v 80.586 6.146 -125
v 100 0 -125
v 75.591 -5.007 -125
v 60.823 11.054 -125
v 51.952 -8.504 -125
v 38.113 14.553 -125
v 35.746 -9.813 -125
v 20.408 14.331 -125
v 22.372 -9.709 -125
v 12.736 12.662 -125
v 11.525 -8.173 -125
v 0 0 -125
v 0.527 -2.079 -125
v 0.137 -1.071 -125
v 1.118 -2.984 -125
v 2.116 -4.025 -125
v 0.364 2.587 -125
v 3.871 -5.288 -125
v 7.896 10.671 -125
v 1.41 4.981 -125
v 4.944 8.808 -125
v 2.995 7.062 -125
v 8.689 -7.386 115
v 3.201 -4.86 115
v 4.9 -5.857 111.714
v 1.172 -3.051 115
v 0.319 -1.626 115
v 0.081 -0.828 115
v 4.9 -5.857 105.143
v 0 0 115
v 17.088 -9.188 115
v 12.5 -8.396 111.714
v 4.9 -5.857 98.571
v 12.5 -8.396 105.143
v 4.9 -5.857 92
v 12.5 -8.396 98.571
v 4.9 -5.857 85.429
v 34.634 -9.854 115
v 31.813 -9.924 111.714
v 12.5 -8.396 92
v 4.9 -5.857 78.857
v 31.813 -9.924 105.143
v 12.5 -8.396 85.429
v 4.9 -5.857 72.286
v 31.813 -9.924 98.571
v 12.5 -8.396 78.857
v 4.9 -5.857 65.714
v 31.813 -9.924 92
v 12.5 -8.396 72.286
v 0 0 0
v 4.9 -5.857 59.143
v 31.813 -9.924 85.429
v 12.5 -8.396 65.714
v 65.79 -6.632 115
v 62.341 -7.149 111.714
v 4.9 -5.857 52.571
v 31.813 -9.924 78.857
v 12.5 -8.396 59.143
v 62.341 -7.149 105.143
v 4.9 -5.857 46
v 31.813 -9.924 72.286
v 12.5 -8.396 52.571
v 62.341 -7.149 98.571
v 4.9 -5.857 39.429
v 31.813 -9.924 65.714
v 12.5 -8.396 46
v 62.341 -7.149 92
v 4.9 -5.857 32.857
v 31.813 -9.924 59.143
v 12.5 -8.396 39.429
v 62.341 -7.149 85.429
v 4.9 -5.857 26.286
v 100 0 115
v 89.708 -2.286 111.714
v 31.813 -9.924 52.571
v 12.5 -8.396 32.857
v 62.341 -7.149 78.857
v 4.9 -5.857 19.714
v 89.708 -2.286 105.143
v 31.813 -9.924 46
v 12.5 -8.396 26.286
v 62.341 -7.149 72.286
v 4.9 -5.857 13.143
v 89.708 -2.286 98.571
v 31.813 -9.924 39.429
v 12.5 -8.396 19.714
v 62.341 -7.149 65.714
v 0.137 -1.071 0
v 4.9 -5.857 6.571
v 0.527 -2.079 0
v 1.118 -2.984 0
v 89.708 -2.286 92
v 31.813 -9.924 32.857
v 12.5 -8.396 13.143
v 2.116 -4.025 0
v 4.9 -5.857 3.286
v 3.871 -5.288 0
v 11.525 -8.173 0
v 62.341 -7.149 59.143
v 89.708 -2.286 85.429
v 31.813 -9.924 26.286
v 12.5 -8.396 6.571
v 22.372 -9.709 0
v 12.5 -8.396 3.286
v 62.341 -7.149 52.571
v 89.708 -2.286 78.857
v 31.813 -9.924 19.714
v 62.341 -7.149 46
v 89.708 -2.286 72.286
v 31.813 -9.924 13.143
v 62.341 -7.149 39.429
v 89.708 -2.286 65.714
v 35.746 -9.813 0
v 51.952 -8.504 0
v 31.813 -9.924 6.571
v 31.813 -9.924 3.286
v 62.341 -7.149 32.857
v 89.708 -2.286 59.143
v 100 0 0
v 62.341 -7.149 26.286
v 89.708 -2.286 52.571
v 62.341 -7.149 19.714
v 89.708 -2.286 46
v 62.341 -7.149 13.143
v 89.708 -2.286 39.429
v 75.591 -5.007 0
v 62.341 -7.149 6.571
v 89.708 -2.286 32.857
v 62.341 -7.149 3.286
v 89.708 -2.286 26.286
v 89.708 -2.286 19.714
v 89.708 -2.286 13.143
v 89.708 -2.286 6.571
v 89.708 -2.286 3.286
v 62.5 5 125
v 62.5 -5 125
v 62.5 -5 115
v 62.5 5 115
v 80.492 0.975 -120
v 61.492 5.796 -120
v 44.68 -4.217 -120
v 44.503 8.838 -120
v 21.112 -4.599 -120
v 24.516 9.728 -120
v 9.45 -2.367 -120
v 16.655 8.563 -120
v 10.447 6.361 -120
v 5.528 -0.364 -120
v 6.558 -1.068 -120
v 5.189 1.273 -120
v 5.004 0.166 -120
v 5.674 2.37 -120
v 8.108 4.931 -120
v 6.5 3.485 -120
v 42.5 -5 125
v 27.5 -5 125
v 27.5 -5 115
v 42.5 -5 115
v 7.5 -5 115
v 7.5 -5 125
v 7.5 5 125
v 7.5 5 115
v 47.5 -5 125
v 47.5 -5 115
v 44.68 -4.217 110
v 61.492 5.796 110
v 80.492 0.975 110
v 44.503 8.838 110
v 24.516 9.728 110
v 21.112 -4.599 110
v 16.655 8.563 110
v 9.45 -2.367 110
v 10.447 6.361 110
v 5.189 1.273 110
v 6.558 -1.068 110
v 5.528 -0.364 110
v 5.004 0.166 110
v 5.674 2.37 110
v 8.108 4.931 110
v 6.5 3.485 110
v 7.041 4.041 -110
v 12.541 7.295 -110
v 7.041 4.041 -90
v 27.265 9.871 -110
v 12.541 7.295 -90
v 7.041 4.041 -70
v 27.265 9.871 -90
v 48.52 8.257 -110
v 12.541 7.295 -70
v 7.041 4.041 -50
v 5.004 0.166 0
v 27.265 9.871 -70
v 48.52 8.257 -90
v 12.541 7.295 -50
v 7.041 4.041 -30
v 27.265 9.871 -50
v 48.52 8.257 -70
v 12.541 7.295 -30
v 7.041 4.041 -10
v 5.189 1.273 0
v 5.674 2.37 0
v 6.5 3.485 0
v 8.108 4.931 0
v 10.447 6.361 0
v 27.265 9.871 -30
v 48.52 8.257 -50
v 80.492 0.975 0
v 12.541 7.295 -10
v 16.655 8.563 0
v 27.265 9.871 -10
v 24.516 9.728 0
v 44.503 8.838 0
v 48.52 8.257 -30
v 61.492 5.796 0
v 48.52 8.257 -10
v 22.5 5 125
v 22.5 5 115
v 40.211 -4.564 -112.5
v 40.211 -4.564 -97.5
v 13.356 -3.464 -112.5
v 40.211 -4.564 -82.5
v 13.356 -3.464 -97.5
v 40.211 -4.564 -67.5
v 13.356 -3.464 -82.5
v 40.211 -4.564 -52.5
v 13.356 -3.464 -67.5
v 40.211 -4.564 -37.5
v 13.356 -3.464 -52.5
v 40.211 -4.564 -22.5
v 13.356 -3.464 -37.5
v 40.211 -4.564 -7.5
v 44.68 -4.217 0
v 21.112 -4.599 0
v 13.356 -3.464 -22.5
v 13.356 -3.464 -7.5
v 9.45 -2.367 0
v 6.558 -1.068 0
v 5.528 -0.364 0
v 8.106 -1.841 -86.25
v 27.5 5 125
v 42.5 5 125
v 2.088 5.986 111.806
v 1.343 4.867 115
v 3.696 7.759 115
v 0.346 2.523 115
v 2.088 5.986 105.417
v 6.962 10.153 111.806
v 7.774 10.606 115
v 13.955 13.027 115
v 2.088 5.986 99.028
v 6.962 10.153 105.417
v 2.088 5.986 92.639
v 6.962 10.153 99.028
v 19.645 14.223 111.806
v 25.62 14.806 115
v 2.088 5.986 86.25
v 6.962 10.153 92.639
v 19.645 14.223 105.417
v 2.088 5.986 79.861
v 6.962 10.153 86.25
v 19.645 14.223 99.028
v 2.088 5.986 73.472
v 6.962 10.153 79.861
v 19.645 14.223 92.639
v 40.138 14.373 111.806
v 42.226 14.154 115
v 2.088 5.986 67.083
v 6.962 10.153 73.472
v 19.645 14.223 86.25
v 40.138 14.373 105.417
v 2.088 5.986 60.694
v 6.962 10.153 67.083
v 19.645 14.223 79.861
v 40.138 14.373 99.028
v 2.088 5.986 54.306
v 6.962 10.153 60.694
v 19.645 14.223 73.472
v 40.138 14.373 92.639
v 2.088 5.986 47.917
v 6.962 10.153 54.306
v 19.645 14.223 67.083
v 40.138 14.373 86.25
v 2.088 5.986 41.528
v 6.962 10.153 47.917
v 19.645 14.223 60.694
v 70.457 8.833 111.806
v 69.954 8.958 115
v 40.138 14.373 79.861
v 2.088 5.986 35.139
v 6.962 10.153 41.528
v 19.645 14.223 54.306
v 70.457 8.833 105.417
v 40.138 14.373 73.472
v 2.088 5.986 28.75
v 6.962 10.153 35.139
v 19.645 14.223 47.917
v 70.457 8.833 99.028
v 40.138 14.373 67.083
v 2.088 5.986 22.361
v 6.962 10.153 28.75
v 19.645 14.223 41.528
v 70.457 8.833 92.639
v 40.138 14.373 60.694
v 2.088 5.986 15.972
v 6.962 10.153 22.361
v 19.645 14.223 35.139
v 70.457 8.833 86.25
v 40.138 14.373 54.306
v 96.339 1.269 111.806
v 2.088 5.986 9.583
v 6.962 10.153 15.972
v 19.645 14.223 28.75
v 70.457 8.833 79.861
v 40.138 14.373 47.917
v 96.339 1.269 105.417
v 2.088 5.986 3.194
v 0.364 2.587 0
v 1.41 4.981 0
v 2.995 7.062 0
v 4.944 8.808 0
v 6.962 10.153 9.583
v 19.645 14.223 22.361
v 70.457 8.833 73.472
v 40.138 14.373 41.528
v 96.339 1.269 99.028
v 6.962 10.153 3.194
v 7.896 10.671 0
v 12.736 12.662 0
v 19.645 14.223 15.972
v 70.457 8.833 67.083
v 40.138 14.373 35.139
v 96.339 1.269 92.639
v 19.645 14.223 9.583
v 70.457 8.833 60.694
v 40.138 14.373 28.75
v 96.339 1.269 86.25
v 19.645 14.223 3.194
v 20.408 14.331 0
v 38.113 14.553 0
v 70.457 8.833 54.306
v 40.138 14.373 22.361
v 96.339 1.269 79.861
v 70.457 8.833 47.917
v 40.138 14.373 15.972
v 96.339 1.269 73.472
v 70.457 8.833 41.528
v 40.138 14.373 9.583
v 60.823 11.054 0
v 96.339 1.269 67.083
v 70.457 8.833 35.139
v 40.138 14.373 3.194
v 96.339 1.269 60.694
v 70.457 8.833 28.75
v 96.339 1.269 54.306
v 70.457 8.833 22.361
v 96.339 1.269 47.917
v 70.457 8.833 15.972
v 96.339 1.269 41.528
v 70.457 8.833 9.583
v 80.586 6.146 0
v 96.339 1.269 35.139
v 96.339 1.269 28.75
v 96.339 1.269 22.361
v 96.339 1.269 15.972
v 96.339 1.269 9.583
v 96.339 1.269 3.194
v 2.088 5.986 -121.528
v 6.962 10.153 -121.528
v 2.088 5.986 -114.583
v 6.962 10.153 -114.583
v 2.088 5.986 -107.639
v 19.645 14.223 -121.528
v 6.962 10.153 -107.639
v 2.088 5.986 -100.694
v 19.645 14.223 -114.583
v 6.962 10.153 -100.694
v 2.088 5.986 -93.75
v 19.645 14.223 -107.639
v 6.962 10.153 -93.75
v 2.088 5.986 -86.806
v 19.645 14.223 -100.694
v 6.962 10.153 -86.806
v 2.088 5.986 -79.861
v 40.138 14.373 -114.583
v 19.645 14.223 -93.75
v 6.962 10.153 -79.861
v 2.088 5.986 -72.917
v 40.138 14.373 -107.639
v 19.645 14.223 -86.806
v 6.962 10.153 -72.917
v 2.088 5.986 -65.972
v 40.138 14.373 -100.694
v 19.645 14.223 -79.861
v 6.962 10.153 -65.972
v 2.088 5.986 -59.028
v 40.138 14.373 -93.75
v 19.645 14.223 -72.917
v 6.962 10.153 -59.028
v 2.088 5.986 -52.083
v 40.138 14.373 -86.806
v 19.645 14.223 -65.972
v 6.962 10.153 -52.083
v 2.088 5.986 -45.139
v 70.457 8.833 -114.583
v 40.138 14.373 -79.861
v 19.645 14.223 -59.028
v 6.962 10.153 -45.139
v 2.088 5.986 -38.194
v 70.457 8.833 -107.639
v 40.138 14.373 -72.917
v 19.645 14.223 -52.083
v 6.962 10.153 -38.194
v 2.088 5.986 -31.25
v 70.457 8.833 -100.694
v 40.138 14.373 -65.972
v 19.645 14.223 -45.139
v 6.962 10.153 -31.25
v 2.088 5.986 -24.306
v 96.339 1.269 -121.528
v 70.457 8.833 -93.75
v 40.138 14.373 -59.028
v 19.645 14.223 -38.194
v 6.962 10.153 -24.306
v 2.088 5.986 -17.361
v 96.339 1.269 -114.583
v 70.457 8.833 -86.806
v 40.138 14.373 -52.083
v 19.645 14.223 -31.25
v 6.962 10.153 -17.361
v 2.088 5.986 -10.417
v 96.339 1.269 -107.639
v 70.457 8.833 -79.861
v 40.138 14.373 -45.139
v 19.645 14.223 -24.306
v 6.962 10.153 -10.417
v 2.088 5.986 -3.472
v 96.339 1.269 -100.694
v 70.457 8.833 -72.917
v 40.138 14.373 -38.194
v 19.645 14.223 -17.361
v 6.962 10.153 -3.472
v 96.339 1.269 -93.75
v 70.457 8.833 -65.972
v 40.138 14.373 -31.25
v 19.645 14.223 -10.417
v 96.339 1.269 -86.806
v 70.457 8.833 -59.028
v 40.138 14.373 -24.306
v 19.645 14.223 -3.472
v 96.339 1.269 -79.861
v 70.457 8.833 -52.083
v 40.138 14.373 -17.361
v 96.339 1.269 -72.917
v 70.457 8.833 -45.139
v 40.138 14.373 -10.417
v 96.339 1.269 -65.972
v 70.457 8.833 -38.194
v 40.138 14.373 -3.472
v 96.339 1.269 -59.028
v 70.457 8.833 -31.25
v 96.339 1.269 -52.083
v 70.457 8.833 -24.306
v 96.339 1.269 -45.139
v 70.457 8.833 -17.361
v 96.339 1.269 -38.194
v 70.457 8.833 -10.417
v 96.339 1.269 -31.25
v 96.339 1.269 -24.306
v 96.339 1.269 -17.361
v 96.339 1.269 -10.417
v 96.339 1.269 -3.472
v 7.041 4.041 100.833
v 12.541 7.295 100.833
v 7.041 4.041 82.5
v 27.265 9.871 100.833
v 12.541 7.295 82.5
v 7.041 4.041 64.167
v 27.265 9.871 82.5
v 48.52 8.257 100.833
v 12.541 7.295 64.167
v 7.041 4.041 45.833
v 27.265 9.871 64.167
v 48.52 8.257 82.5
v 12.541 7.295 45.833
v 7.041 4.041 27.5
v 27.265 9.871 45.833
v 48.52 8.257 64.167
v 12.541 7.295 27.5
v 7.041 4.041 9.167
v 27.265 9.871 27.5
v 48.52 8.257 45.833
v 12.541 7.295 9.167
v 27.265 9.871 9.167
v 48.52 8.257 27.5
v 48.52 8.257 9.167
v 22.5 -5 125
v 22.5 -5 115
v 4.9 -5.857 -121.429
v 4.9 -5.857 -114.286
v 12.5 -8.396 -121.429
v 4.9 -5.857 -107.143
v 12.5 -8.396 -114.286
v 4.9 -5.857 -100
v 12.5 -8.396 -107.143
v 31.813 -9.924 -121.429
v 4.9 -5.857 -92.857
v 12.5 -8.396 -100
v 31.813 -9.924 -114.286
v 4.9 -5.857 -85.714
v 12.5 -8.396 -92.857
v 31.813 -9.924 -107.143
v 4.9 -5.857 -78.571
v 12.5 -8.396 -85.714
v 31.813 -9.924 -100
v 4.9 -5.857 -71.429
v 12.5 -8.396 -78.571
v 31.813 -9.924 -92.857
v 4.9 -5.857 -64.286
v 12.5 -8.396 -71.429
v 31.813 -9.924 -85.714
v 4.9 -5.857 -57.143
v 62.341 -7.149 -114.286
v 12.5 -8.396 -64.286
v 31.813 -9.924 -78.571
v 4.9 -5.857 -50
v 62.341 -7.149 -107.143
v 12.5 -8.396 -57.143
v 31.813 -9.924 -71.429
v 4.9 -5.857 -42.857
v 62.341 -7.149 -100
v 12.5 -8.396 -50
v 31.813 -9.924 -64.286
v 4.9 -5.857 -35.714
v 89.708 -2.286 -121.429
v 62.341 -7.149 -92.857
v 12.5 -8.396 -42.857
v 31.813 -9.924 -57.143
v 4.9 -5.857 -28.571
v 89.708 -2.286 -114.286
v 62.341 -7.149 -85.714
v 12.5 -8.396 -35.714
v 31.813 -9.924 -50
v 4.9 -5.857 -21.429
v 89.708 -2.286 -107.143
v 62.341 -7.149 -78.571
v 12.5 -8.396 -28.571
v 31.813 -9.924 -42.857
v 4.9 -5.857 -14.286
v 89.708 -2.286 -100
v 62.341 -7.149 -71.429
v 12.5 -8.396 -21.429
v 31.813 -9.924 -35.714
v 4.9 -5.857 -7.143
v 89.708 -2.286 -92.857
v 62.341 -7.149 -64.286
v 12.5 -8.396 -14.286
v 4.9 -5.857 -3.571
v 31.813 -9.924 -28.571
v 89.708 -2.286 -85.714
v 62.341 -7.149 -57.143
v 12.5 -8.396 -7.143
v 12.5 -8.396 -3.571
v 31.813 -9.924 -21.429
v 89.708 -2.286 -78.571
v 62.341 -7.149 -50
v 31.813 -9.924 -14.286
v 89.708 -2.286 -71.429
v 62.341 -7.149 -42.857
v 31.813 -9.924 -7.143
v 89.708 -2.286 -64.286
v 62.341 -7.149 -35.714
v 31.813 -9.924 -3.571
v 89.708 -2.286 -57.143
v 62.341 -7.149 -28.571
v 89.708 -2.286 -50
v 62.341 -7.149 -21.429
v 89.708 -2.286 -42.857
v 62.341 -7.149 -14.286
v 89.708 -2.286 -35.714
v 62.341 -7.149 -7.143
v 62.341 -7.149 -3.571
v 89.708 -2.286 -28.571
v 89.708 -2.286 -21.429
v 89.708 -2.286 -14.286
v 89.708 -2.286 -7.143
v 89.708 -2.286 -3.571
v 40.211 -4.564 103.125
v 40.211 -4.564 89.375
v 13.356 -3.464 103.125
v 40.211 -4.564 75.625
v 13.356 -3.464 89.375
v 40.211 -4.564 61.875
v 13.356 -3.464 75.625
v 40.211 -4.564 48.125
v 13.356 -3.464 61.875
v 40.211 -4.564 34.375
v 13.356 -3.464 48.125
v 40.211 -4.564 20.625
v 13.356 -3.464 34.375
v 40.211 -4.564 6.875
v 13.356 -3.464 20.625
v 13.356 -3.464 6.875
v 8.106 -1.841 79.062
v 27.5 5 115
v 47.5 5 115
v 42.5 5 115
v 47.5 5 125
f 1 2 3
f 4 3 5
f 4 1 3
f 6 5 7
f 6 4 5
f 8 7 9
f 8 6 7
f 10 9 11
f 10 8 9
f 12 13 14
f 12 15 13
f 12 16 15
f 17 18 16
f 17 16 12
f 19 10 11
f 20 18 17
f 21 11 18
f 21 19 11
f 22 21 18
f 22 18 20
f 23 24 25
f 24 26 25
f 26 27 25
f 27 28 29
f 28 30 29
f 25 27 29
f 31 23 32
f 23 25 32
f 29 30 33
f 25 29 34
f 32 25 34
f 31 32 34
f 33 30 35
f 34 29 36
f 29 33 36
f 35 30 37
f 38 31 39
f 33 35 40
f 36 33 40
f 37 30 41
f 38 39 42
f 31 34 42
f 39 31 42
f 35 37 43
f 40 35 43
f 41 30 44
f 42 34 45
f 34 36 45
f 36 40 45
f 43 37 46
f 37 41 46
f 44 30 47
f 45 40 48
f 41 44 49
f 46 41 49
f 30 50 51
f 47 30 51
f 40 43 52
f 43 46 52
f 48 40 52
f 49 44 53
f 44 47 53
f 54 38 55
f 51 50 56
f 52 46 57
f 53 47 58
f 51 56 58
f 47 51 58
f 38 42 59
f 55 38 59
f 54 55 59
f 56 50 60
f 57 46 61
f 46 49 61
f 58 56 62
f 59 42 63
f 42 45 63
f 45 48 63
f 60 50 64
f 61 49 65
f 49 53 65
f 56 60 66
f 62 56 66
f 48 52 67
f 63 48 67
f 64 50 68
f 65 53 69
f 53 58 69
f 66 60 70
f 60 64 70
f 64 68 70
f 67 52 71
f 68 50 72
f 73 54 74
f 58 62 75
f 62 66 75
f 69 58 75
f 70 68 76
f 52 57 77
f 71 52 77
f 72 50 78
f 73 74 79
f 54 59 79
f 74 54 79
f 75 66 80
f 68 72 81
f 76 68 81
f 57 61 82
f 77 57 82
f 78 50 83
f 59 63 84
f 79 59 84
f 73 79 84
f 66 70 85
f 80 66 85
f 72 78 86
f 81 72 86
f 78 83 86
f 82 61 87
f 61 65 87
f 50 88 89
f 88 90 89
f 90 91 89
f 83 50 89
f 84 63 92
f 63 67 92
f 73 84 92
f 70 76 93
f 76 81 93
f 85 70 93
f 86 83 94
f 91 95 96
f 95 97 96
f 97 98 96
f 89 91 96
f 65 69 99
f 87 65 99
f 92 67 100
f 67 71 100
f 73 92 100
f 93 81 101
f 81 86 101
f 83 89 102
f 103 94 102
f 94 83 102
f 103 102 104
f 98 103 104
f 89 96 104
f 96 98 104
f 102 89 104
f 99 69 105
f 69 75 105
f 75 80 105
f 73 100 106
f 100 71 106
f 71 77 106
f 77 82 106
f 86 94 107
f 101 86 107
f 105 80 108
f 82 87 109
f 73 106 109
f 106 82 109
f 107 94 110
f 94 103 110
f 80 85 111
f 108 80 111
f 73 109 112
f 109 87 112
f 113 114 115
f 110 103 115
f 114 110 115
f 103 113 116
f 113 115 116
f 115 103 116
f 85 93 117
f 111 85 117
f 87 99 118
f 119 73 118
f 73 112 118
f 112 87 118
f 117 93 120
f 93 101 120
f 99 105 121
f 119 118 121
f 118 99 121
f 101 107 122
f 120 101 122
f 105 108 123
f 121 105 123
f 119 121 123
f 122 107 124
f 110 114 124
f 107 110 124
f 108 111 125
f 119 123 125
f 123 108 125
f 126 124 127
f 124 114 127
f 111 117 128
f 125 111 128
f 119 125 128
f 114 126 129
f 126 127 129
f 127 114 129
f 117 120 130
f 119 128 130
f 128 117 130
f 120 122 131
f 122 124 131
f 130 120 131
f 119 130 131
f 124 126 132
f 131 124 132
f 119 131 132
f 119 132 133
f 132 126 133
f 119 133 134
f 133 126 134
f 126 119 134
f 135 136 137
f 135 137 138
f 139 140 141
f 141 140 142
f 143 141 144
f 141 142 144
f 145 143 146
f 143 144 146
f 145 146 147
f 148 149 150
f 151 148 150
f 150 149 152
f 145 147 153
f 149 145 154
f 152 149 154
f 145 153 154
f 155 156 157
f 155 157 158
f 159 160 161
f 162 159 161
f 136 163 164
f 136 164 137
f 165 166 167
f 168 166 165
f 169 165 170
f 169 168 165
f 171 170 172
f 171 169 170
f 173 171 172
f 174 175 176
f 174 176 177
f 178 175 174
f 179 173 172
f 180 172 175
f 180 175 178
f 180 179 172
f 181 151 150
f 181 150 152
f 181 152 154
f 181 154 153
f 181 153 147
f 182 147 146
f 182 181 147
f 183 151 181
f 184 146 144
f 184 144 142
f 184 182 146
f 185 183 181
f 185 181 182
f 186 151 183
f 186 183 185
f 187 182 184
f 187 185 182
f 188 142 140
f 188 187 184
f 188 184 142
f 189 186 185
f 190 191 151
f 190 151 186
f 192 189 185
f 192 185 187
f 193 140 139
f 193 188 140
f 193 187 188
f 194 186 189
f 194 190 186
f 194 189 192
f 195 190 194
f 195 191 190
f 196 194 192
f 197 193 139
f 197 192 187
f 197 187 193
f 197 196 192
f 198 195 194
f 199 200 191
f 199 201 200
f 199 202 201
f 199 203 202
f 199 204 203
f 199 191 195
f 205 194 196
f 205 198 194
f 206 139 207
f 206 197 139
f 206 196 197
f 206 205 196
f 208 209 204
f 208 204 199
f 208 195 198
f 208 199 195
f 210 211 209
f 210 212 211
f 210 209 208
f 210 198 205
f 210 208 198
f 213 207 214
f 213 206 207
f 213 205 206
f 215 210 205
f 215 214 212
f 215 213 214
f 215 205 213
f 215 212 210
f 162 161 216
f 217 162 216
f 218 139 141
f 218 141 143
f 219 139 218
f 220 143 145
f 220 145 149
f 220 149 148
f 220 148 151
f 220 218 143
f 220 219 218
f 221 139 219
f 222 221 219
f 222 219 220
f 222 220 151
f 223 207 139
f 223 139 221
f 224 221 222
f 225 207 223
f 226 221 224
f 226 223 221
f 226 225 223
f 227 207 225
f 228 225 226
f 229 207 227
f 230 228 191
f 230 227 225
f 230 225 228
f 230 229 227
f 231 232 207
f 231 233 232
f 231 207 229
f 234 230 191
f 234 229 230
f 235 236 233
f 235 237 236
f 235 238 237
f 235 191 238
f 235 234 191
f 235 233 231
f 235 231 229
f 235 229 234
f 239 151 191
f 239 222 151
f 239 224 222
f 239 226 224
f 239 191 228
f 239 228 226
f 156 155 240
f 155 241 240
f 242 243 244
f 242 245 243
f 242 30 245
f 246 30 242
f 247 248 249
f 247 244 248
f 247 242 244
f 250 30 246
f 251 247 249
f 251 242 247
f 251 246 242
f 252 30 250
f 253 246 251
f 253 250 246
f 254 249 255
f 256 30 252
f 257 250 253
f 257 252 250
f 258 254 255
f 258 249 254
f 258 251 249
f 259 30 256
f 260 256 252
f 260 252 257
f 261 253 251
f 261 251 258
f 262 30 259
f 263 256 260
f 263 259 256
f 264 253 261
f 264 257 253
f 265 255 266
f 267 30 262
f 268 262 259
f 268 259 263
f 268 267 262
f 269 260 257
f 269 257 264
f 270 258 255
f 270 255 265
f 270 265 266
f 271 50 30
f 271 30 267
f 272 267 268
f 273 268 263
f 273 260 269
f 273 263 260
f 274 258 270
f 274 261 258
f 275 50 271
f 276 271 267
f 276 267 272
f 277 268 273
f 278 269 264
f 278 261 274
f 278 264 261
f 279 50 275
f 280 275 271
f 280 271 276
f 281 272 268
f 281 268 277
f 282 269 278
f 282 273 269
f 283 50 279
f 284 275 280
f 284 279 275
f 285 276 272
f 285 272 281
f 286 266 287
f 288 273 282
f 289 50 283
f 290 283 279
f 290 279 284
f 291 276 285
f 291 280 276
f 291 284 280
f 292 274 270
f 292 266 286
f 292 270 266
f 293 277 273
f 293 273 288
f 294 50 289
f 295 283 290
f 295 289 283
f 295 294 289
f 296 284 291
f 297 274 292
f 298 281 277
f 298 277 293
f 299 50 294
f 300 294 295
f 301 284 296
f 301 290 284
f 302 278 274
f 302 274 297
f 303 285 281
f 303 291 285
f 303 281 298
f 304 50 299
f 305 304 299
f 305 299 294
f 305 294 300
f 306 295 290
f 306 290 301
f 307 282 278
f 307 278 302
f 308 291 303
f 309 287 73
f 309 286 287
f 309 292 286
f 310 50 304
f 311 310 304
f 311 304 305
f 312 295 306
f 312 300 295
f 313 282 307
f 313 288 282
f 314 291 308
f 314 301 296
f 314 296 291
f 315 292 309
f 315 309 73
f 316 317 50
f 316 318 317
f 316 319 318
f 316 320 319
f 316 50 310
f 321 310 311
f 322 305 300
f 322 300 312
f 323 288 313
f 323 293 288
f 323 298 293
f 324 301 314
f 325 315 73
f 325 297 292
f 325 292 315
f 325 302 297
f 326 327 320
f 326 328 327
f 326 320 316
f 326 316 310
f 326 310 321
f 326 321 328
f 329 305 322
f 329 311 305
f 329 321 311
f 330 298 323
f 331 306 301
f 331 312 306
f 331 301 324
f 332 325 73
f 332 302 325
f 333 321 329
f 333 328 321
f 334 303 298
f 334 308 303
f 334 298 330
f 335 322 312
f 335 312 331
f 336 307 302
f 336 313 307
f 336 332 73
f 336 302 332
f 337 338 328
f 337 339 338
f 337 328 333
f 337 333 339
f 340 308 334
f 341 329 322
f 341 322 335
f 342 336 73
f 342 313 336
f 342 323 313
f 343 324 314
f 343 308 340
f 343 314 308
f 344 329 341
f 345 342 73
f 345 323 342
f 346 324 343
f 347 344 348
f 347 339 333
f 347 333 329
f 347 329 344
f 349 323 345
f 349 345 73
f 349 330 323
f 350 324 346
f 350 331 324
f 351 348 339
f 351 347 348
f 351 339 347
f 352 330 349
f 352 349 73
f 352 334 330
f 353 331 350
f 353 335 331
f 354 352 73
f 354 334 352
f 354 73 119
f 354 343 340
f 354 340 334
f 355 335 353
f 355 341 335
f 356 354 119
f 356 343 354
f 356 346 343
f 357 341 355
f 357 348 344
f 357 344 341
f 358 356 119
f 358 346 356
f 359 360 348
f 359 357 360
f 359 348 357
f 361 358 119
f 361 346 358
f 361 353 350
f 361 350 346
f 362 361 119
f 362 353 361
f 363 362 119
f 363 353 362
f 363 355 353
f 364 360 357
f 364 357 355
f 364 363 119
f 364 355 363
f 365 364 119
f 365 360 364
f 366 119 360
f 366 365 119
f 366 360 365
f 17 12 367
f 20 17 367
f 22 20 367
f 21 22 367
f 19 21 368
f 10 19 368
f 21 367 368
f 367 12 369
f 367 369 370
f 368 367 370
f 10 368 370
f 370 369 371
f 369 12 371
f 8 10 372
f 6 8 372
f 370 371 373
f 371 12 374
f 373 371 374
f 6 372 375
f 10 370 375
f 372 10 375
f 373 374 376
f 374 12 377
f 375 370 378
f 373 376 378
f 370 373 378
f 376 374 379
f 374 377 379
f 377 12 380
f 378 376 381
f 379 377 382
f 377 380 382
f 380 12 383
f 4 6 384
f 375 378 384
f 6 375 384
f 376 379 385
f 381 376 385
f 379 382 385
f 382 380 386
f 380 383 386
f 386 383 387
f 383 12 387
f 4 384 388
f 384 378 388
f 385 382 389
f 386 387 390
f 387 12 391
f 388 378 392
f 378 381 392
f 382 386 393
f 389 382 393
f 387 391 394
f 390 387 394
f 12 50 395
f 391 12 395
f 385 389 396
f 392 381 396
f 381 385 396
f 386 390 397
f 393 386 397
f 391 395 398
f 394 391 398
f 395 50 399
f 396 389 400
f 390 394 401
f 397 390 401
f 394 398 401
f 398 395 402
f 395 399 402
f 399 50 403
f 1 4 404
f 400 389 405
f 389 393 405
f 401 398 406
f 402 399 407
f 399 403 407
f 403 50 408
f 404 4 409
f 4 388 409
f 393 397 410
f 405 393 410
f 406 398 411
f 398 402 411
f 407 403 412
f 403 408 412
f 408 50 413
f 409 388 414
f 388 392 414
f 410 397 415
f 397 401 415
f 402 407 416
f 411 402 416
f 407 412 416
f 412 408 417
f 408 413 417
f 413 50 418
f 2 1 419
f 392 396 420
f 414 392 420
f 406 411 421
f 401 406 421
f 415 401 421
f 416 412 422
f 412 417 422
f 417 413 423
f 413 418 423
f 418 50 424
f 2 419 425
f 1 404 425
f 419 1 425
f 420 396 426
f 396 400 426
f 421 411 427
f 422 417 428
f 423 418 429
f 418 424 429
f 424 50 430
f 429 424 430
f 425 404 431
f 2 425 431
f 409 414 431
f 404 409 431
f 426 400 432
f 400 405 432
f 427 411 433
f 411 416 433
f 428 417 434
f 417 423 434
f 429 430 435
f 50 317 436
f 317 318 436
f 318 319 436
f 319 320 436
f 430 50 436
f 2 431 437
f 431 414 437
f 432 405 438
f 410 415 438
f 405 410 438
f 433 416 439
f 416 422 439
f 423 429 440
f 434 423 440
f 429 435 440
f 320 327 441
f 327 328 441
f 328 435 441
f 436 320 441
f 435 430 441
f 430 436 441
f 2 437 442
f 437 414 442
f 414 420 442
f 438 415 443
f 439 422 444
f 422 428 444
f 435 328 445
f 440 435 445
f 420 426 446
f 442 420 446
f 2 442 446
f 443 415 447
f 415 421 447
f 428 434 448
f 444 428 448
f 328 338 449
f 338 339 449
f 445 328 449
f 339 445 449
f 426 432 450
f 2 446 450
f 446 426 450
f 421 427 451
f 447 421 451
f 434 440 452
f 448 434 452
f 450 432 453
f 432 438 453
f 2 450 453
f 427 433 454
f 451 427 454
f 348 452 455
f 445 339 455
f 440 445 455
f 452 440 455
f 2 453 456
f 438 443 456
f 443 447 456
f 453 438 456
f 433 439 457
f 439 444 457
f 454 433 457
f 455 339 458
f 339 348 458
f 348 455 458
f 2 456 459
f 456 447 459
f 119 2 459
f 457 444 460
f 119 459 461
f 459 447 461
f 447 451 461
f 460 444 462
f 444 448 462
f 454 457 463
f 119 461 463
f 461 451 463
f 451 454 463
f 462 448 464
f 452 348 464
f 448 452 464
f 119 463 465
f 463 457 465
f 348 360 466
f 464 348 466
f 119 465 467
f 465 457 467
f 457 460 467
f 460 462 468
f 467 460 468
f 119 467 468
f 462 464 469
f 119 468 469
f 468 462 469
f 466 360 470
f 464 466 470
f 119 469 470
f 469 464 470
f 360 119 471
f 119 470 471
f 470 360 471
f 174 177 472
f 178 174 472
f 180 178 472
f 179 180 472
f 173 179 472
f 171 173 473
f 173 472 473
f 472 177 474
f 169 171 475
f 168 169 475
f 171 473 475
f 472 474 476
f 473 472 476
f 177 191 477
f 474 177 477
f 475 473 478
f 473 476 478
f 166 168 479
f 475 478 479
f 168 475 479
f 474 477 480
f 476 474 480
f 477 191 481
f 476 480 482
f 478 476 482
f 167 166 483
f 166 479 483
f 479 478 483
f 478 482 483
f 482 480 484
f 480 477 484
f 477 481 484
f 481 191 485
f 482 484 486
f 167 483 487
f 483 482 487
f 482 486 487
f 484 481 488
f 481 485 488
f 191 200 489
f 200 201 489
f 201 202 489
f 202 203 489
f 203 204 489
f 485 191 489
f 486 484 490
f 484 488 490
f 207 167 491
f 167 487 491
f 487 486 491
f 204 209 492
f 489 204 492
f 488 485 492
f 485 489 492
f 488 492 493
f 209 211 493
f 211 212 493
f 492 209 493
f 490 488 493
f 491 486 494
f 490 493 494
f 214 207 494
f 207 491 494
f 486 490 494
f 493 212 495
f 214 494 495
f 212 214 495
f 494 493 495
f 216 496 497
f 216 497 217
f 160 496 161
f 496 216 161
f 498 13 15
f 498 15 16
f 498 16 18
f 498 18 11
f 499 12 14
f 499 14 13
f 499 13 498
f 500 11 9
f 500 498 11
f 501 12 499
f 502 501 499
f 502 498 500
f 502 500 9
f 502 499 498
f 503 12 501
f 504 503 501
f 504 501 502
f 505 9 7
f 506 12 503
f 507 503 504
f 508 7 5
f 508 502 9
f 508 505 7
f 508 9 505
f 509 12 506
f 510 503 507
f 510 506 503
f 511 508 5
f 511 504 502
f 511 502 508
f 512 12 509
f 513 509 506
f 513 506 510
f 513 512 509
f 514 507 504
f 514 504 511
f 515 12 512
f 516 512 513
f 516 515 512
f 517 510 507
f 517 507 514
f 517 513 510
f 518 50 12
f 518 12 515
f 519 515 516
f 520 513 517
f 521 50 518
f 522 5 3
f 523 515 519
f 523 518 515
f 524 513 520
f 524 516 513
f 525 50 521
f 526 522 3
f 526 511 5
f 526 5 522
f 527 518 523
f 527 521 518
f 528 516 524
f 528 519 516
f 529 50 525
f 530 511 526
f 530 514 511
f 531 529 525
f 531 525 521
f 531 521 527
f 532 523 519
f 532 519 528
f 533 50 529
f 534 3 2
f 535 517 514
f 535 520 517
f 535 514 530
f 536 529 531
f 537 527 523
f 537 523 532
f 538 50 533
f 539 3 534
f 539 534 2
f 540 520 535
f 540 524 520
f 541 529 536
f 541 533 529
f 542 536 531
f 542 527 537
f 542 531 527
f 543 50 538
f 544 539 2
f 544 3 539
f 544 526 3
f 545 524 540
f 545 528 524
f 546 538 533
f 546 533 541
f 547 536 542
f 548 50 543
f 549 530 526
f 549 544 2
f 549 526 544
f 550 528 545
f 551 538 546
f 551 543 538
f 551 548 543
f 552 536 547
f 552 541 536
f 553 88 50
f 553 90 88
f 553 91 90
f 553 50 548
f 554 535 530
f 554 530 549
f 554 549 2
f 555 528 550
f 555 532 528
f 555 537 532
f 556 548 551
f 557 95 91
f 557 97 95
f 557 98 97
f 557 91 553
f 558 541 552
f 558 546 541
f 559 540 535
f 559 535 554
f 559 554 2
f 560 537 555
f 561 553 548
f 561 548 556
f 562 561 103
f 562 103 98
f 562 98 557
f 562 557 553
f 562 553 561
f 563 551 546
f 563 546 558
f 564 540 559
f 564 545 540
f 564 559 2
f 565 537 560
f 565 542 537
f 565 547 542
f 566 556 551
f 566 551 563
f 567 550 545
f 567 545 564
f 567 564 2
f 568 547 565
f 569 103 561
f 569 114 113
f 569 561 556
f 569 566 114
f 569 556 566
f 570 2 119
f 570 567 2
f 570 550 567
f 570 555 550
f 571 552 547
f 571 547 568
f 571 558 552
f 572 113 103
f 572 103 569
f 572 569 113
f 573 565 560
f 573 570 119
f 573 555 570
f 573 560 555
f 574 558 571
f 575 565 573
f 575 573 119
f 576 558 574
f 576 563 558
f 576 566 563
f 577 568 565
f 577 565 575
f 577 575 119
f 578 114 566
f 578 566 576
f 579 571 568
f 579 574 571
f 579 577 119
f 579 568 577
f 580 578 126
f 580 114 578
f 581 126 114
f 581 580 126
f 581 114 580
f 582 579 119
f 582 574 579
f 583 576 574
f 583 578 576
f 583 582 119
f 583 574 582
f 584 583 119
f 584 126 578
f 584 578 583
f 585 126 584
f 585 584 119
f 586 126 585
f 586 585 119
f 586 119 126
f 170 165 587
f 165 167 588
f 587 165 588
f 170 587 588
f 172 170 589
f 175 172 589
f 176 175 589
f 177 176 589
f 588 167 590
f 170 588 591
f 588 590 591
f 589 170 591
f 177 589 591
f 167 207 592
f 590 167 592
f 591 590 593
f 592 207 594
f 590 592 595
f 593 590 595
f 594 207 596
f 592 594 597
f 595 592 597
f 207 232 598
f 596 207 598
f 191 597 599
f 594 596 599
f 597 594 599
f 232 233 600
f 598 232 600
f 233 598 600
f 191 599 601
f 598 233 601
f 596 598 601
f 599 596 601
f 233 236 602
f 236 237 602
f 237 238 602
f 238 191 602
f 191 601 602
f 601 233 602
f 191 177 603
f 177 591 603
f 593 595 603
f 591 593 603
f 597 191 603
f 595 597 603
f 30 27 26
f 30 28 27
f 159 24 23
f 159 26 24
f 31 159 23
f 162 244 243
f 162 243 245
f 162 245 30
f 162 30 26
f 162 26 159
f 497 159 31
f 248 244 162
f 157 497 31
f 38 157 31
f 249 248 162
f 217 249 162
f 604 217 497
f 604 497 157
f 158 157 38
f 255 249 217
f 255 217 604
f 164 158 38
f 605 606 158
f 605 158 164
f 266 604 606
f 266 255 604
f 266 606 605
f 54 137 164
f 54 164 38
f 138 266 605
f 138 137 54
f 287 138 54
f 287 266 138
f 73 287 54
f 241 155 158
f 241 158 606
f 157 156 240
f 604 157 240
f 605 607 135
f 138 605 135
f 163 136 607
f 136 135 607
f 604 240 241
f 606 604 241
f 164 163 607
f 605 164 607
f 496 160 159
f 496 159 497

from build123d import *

# Parameters (mm, degrees)
BOSS_EXTRUDE1_DEPTH     = 125
CUT_EXTRUDE1_DEPTH      = 110
CUT_EXTRUDE1_DEPTH_BACK = 120
SKETCH8_OUTSIDE_W       = 156.08
SKETCH8_OUTSIDE_H       = 80.93
SKETCH8_OUTSIDE_W_2     = 15
SKETCH8_OUTSIDE_H_2     = 10
CUT_EXTRUDE2_DEPTH      = 10


with BuildPart() as part:
    # Sketch1 → Boss-Extrude1 (new body, symmetric)
    with BuildSketch(Plane.XY):
        with BuildLine():
            add(Edge.make_bspline(
                [(0, 0), (0.000850995, 0.329659199), (0.029549865, 0.927472015), (0.14385133, 1.796745902), (0.437026819, 2.918116545), (0.854897816, 3.99067399), (1.431457873, 5.075606208), (2.192315162, 6.177305776), (3.200330795, 7.329994922), (4.495933807, 8.510625759), (6.154032841, 9.714948919), (8.274086435, 10.929186229), (10.956963281, 12.114631433), (14.147653492, 13.152534318), (18.040460609, 14.036328853), (23.13432232, 14.736569605), (29.235682959, 15.027445823), (35.337980191, 14.824799668), (41.101061226, 14.313753112), (46.84100573, 13.596774566), (51.603718071, 12.850513756), (56.345578755, 11.983351698), (61.067148387, 11.013921336), (64.832774323, 10.182970339), (68.586460194, 9.301464098), (72.329426272, 8.372556112), (76.059801155, 7.399362237), (79.315748534, 6.509324276), (82.095955547, 5.720960272), (84.412746103, 5.044415193), (86.253737616, 4.495737821), (88.110746108, 3.929395104), (89.928948501, 3.364622885), (91.806033909, 2.766575591), (93.571042413, 2.195551738), (95.520153622, 1.546294126), (97.13830136, 1.000944859), (98.775140125, 0.431667147), (99.586664269, 0.14652965), (100.000220498, 0)],
                knots=[0, 0, 0, 0, 0, 0.011046069, 0.020081733, 0.029325805, 0.03880189, 0.049580055, 0.06120956, 0.074146174, 0.090070544, 0.108265326, 0.129826997, 0.155964864, 0.18830697, 0.220649281, 0.263591413, 0.32827592, 0.392960436, 0.425302696, 0.457644956, 0.52232947, 0.55467173, 0.58701399, 0.619356253, 0.651698515, 0.684040775, 0.716383035, 0.748725291, 0.764896419, 0.781067547, 0.797238677, 0.813409806, 0.829580935, 0.845752065, 0.861923198, 0.878094331, 0.894265464, 0.910433902, 0.910433902, 0.910433902, 0.910433902, 0.910433902], degree=4))
            add(Edge.make_bspline(
                [(0, 0), (0.000283694, -0.169267254), (0.015976794, -0.461371136), (0.077487025, -0.88514164), (0.233270026, -1.435649885), (0.451244669, -1.960918505), (0.763020391, -2.515682909), (1.196819683, -3.111846412), (1.800946429, -3.766711239), (2.645862845, -4.495413172), (3.845009807, -5.315163118), (5.520192869, -6.210587445), (7.890487327, -7.180714875), (10.947062049, -8.096276481), (15.429604607, -9.039640979), (21.207967366, -9.730011133), (27.977535992, -10.02746215), (35.648602876, -9.889128299), (42.346864335, -9.465706657), (48.074827103, -8.93985543), (53.791477179, -8.306095929), (59.496830619, -7.576550222), (65.188499989, -6.746051578), (70.86666832, -5.830240622), (75.589869863, -5.014181774), (79.362447213, -4.33071773), (82.659602016, -3.705830248), (85.480106996, -3.151491524), (87.596226543, -2.723280533), (89.000489113, -2.434123885), (90.181059485, -2.187185496), (91.104029231, -1.992562417), (92.305099816, -1.735390328), (93.655404022, -1.443860687), (95.389810689, -1.059643077), (97.102663756, -0.674849293), (98.714450572, -0.301843412), (99.575627153, -0.100232022), (100.000220498, 0)],
                knots=[0, 0, 0, 0, 0, 0.005887152, 0.010193359, 0.014866851, 0.019889426, 0.025655397, 0.032314697, 0.040497527, 0.050864902, 0.064448179, 0.082823086, 0.106555664, 0.139953895, 0.175459216, 0.242255956, 0.309052716, 0.375849477, 0.442646237, 0.47604462, 0.509443003, 0.576239764, 0.643036527, 0.676434909, 0.709833291, 0.743231671, 0.77663005, 0.793329242, 0.810028433, 0.818378029, 0.826727624, 0.83507722, 0.843426816, 0.860126007, 0.876825198, 0.893524389, 0.91022358, 0.91022358, 0.91022358, 0.91022358, 0.91022358], degree=4))
        make_face()
    extrude(amount=BOSS_EXTRUDE1_DEPTH, both=True)

    # Sketch6 → Cut-Extrude1 (cut, two sides)
    with BuildSketch(Plane.XY) as cut_extrude1_sk:
        with BuildLine():
            add(Edge.make_bspline(
                [(5.003866411, 0.16593331), (5.021771107, 0.603167174), (5.179582681, 1.45668418), (5.828059264, 2.731623867), (6.970434665, 4.055197794), (9.059941641, 5.70999826), (12.439790451, 7.406031049), (17.102385774, 8.772586441), (22.086939339, 9.580996278), (28.969887571, 10.04915127), (37.811358565, 9.719164197), (48.519550578, 8.365627259), (62.800967104, 5.688073766), (73.468720144, 2.987314718), (80.492223408, 0.975075783)],
                knots=[0.003107056, 0.003107056, 0.003107056, 0.003107056, 0.026472192, 0.049837329, 0.073202466, 0.096567602, 0.143297876, 0.190028149, 0.236758422, 0.283488695, 0.376949242, 0.470409788, 0.563870335, 0.750791428, 0.750791428, 0.750791428, 0.750791428], degree=3))
            add(Edge.make_bspline(
                [(80.492223408, 0.975075783), (73.808709309, -0.294311553), (63.724097701, -1.995472923), (50.2739718, -3.721966825), (40.201550005, -4.64981718), (31.854573956, -4.99623266), (25.257558055, -4.894657534), (20.376304938, -4.583057975), (16.407020376, -4.077297068), (13.341823588, -3.482519629), (11.126614852, -2.928004065), (9.036775347, -2.250698534), (7.465669402, -1.576012545), (6.39422808, -0.985208256), (5.718999313, -0.532122097), (5.309123649, -0.182799424), (5.089567118, 0.053028449), (5.034725373, 0.122545069), (5.003866411, 0.16593331)],
                knots=[0.025550827, 0.025550827, 0.025550827, 0.025550827, 0.20536823, 0.295276931, 0.385185632, 0.475094334, 0.520048685, 0.565003035, 0.609957386, 0.632434561, 0.654911737, 0.677388912, 0.699866088, 0.711104675, 0.722343263, 0.733581851, 0.739201144, 0.744820438, 0.744820438, 0.744820438, 0.744820438], degree=3))
        make_face()
    extrude(amount=CUT_EXTRUDE1_DEPTH, mode=Mode.SUBTRACT)
    extrude(cut_extrude1_sk.sketch, amount=-CUT_EXTRUDE1_DEPTH_BACK, mode=Mode.SUBTRACT)

    # Sketch8 outside → Cut-Extrude2 (cut)
    with BuildSketch(Plane.XY.offset(125)):
        with Locations((50, 2.485)):
            Rectangle(SKETCH8_OUTSIDE_W, SKETCH8_OUTSIDE_H)
        with Locations((35, 0)):
            Rectangle(SKETCH8_OUTSIDE_W_2, SKETCH8_OUTSIDE_H_2, mode=Mode.SUBTRACT)
        with Locations((15, 0)):
            Rectangle(SKETCH8_OUTSIDE_W_2, SKETCH8_OUTSIDE_H_2, mode=Mode.SUBTRACT)
        with Locations((55, 0)):
            Rectangle(SKETCH8_OUTSIDE_W_2, SKETCH8_OUTSIDE_H_2, mode=Mode.SUBTRACT)
    extrude(amount=-CUT_EXTRUDE2_DEPTH, mode=Mode.SUBTRACT)


solid = part.part
